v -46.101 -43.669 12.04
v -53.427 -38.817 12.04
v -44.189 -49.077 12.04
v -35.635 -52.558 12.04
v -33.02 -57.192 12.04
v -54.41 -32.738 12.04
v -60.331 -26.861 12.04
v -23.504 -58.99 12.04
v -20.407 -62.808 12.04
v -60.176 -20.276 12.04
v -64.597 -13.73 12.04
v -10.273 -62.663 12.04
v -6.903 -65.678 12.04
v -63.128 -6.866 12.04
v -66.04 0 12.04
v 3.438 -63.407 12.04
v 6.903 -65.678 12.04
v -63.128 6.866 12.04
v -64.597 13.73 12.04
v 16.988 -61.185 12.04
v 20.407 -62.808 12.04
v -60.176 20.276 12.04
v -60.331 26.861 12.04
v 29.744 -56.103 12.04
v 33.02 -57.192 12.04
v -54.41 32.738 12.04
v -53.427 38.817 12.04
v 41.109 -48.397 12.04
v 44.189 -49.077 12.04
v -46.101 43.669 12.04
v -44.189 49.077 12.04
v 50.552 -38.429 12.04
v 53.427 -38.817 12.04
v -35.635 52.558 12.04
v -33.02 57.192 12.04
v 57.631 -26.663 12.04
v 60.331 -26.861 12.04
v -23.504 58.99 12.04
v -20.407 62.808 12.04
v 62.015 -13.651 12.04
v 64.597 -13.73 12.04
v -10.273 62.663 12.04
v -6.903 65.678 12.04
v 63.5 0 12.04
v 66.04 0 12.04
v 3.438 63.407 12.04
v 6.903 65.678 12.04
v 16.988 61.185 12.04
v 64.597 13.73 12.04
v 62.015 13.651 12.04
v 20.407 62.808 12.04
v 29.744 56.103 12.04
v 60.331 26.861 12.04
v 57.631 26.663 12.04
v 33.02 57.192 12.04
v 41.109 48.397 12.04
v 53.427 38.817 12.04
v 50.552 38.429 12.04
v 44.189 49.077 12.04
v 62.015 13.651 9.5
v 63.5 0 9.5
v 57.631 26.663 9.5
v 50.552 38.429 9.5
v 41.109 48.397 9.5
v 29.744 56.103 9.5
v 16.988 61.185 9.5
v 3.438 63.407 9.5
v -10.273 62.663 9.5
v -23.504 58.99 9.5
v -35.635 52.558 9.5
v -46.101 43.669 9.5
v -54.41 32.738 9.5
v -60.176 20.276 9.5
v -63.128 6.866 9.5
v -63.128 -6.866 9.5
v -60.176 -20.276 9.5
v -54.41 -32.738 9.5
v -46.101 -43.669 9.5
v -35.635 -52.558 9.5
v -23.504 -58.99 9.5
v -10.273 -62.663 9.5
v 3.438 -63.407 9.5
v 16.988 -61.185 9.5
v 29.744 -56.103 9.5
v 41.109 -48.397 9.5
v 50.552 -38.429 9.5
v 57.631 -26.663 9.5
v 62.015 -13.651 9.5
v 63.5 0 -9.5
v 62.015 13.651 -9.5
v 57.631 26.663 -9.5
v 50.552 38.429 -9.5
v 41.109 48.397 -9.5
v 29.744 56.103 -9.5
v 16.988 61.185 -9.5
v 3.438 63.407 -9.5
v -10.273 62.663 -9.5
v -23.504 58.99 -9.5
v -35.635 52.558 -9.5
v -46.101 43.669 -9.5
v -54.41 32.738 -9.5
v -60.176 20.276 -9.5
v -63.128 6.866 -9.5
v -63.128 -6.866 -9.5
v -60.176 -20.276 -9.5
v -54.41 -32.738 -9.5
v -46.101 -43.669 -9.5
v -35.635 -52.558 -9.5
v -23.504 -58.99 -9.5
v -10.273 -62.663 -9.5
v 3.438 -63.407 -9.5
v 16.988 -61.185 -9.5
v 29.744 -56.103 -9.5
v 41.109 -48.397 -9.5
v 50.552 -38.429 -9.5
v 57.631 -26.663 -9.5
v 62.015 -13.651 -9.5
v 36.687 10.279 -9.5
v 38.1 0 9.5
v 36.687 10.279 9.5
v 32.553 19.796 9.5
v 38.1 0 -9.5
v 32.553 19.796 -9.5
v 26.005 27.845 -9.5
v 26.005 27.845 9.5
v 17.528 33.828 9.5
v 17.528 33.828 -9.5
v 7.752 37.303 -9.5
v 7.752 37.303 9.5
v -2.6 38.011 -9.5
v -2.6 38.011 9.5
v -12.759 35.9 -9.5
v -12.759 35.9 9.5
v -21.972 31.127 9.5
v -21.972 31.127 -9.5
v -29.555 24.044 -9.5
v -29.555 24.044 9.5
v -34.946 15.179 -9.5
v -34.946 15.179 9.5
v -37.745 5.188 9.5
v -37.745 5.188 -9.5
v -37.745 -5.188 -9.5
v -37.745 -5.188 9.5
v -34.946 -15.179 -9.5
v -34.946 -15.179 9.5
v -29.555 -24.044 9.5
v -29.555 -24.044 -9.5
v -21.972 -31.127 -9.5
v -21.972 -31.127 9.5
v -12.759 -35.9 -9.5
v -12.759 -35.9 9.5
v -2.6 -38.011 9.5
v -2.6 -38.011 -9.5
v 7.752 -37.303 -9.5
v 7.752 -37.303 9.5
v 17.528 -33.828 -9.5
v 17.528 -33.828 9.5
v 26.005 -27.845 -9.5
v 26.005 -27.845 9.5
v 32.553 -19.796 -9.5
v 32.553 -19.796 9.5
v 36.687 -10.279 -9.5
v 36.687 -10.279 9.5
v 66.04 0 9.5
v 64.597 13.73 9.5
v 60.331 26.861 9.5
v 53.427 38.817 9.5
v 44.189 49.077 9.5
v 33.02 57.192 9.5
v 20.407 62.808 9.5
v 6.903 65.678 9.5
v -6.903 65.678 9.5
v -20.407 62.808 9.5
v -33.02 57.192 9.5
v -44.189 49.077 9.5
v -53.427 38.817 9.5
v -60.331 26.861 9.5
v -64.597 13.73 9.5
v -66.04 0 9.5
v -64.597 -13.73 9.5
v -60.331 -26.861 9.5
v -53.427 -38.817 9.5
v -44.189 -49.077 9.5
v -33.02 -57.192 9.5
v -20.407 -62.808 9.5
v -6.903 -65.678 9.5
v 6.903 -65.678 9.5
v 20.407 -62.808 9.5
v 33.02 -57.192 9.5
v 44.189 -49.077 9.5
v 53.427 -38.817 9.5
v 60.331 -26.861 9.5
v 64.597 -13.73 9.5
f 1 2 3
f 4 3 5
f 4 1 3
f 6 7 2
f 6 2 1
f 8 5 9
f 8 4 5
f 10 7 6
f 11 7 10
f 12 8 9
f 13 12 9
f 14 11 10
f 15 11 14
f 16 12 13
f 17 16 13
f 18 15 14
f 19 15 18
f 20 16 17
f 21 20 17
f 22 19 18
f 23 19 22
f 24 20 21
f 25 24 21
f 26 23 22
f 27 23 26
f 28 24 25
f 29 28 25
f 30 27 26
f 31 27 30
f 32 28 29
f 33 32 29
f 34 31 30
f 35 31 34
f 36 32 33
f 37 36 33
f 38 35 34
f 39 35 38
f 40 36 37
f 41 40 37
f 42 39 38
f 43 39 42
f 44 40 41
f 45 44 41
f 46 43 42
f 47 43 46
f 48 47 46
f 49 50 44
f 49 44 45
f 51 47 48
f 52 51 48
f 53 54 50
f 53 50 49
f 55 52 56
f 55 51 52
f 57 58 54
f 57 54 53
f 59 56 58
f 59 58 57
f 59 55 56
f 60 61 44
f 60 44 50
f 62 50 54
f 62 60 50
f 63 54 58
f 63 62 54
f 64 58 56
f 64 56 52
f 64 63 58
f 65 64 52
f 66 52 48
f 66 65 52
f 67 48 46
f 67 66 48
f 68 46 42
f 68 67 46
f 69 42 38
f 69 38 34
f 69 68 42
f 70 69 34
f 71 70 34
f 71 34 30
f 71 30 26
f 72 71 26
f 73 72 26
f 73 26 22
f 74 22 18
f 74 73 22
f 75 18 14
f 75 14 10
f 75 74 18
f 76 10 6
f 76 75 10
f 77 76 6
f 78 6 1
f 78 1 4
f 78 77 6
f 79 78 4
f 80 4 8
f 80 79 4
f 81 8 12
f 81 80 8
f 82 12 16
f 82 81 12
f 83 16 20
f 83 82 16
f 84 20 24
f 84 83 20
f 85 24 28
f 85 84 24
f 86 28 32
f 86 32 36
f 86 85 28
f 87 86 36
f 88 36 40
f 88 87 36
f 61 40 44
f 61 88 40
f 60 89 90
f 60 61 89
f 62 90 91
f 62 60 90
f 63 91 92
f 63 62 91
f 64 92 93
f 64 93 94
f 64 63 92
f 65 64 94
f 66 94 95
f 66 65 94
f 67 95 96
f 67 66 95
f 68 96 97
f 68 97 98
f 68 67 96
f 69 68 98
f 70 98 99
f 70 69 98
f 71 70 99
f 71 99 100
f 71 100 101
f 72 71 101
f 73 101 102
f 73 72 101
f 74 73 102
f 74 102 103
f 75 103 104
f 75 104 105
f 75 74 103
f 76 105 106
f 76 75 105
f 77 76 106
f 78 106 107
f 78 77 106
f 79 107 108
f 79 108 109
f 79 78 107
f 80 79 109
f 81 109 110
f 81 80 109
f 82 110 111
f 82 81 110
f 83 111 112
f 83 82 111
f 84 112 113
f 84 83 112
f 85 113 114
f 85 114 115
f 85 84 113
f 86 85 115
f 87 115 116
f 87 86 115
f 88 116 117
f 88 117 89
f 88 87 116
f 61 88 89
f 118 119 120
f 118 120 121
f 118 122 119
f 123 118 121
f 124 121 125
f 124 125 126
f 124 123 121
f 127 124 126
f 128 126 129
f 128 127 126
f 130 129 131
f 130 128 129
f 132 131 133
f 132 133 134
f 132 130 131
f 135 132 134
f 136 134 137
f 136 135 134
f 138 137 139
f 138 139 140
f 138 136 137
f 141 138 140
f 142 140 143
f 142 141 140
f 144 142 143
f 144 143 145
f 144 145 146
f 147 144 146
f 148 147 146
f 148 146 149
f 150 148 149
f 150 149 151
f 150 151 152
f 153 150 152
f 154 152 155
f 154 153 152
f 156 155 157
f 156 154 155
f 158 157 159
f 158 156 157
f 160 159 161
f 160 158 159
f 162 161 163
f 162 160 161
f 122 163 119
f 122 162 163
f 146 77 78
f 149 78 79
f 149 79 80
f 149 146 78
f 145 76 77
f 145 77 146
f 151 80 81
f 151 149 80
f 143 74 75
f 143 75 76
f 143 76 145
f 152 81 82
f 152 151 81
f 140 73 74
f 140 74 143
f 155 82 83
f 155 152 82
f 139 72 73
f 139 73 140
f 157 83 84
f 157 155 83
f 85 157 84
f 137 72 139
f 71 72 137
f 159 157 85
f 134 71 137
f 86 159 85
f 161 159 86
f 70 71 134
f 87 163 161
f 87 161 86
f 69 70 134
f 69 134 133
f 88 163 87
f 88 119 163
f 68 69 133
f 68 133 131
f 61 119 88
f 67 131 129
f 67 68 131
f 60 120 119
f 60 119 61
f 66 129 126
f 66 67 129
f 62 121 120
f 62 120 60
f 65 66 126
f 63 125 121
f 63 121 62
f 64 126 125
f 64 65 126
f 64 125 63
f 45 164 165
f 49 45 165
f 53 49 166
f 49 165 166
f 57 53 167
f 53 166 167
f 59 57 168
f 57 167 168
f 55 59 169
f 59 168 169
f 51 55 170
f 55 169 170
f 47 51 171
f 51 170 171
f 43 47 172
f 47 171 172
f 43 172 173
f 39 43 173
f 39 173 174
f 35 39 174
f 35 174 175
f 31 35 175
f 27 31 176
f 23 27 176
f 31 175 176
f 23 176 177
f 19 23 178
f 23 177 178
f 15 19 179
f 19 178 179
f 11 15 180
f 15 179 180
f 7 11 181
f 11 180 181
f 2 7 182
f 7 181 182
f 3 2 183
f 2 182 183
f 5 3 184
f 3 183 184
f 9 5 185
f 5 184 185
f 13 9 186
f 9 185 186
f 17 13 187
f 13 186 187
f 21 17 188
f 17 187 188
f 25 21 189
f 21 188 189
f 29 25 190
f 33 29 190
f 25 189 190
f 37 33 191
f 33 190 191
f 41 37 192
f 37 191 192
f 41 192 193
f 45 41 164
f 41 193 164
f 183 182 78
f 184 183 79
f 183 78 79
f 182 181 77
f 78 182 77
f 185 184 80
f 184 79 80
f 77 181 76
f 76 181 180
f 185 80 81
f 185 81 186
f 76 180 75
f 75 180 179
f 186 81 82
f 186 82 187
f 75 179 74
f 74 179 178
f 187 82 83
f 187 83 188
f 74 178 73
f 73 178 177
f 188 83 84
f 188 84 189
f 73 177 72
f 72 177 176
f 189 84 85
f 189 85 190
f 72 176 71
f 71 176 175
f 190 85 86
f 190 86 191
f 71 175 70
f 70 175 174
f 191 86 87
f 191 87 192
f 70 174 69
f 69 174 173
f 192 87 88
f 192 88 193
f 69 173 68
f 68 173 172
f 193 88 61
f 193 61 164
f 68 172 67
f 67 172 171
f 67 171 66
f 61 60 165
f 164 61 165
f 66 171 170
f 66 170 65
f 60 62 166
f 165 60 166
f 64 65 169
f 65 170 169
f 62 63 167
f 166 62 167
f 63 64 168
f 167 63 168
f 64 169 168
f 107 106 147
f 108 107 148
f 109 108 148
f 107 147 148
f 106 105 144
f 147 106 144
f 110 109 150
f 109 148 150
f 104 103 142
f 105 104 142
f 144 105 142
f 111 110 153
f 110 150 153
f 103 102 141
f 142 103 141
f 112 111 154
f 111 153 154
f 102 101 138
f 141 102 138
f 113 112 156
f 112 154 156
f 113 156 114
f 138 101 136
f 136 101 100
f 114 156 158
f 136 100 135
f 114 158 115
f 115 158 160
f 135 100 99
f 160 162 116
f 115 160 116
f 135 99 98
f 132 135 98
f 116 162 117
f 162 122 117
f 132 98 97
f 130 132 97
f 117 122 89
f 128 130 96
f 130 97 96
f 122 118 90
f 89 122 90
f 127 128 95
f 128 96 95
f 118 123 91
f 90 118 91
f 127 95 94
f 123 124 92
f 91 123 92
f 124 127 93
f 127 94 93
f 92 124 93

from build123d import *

# Parameters (mm, degrees)
SKETCH1_R           = 63.5
SKETCH1_R_2         = 38.1
BOSS_EXTRUDE1_DEPTH = 9.5
SKETCH2_R           = 66.04
SKETCH2_R_2         = 63.5
BOSS_EXTRUDE2_DEPTH = 2.54


with BuildPart() as part:
    # Sketch1 → Boss-Extrude1 (new, symmetric)
    with BuildSketch(Plane.XY):
        Circle(SKETCH1_R)
        Circle(SKETCH1_R_2, mode=Mode.SUBTRACT)
    extrude(amount=BOSS_EXTRUDE1_DEPTH, both=True)


with BuildPart() as body_2:
    # Sketch2 → Boss-Extrude2 (new body)
    with BuildSketch(Plane.XY.offset(9.5)):
        Circle(SKETCH2_R)
        Circle(SKETCH2_R_2, mode=Mode.SUBTRACT)
    extrude(amount=BOSS_EXTRUDE2_DEPTH)


solid = Compound([part.part, body_2.part])
